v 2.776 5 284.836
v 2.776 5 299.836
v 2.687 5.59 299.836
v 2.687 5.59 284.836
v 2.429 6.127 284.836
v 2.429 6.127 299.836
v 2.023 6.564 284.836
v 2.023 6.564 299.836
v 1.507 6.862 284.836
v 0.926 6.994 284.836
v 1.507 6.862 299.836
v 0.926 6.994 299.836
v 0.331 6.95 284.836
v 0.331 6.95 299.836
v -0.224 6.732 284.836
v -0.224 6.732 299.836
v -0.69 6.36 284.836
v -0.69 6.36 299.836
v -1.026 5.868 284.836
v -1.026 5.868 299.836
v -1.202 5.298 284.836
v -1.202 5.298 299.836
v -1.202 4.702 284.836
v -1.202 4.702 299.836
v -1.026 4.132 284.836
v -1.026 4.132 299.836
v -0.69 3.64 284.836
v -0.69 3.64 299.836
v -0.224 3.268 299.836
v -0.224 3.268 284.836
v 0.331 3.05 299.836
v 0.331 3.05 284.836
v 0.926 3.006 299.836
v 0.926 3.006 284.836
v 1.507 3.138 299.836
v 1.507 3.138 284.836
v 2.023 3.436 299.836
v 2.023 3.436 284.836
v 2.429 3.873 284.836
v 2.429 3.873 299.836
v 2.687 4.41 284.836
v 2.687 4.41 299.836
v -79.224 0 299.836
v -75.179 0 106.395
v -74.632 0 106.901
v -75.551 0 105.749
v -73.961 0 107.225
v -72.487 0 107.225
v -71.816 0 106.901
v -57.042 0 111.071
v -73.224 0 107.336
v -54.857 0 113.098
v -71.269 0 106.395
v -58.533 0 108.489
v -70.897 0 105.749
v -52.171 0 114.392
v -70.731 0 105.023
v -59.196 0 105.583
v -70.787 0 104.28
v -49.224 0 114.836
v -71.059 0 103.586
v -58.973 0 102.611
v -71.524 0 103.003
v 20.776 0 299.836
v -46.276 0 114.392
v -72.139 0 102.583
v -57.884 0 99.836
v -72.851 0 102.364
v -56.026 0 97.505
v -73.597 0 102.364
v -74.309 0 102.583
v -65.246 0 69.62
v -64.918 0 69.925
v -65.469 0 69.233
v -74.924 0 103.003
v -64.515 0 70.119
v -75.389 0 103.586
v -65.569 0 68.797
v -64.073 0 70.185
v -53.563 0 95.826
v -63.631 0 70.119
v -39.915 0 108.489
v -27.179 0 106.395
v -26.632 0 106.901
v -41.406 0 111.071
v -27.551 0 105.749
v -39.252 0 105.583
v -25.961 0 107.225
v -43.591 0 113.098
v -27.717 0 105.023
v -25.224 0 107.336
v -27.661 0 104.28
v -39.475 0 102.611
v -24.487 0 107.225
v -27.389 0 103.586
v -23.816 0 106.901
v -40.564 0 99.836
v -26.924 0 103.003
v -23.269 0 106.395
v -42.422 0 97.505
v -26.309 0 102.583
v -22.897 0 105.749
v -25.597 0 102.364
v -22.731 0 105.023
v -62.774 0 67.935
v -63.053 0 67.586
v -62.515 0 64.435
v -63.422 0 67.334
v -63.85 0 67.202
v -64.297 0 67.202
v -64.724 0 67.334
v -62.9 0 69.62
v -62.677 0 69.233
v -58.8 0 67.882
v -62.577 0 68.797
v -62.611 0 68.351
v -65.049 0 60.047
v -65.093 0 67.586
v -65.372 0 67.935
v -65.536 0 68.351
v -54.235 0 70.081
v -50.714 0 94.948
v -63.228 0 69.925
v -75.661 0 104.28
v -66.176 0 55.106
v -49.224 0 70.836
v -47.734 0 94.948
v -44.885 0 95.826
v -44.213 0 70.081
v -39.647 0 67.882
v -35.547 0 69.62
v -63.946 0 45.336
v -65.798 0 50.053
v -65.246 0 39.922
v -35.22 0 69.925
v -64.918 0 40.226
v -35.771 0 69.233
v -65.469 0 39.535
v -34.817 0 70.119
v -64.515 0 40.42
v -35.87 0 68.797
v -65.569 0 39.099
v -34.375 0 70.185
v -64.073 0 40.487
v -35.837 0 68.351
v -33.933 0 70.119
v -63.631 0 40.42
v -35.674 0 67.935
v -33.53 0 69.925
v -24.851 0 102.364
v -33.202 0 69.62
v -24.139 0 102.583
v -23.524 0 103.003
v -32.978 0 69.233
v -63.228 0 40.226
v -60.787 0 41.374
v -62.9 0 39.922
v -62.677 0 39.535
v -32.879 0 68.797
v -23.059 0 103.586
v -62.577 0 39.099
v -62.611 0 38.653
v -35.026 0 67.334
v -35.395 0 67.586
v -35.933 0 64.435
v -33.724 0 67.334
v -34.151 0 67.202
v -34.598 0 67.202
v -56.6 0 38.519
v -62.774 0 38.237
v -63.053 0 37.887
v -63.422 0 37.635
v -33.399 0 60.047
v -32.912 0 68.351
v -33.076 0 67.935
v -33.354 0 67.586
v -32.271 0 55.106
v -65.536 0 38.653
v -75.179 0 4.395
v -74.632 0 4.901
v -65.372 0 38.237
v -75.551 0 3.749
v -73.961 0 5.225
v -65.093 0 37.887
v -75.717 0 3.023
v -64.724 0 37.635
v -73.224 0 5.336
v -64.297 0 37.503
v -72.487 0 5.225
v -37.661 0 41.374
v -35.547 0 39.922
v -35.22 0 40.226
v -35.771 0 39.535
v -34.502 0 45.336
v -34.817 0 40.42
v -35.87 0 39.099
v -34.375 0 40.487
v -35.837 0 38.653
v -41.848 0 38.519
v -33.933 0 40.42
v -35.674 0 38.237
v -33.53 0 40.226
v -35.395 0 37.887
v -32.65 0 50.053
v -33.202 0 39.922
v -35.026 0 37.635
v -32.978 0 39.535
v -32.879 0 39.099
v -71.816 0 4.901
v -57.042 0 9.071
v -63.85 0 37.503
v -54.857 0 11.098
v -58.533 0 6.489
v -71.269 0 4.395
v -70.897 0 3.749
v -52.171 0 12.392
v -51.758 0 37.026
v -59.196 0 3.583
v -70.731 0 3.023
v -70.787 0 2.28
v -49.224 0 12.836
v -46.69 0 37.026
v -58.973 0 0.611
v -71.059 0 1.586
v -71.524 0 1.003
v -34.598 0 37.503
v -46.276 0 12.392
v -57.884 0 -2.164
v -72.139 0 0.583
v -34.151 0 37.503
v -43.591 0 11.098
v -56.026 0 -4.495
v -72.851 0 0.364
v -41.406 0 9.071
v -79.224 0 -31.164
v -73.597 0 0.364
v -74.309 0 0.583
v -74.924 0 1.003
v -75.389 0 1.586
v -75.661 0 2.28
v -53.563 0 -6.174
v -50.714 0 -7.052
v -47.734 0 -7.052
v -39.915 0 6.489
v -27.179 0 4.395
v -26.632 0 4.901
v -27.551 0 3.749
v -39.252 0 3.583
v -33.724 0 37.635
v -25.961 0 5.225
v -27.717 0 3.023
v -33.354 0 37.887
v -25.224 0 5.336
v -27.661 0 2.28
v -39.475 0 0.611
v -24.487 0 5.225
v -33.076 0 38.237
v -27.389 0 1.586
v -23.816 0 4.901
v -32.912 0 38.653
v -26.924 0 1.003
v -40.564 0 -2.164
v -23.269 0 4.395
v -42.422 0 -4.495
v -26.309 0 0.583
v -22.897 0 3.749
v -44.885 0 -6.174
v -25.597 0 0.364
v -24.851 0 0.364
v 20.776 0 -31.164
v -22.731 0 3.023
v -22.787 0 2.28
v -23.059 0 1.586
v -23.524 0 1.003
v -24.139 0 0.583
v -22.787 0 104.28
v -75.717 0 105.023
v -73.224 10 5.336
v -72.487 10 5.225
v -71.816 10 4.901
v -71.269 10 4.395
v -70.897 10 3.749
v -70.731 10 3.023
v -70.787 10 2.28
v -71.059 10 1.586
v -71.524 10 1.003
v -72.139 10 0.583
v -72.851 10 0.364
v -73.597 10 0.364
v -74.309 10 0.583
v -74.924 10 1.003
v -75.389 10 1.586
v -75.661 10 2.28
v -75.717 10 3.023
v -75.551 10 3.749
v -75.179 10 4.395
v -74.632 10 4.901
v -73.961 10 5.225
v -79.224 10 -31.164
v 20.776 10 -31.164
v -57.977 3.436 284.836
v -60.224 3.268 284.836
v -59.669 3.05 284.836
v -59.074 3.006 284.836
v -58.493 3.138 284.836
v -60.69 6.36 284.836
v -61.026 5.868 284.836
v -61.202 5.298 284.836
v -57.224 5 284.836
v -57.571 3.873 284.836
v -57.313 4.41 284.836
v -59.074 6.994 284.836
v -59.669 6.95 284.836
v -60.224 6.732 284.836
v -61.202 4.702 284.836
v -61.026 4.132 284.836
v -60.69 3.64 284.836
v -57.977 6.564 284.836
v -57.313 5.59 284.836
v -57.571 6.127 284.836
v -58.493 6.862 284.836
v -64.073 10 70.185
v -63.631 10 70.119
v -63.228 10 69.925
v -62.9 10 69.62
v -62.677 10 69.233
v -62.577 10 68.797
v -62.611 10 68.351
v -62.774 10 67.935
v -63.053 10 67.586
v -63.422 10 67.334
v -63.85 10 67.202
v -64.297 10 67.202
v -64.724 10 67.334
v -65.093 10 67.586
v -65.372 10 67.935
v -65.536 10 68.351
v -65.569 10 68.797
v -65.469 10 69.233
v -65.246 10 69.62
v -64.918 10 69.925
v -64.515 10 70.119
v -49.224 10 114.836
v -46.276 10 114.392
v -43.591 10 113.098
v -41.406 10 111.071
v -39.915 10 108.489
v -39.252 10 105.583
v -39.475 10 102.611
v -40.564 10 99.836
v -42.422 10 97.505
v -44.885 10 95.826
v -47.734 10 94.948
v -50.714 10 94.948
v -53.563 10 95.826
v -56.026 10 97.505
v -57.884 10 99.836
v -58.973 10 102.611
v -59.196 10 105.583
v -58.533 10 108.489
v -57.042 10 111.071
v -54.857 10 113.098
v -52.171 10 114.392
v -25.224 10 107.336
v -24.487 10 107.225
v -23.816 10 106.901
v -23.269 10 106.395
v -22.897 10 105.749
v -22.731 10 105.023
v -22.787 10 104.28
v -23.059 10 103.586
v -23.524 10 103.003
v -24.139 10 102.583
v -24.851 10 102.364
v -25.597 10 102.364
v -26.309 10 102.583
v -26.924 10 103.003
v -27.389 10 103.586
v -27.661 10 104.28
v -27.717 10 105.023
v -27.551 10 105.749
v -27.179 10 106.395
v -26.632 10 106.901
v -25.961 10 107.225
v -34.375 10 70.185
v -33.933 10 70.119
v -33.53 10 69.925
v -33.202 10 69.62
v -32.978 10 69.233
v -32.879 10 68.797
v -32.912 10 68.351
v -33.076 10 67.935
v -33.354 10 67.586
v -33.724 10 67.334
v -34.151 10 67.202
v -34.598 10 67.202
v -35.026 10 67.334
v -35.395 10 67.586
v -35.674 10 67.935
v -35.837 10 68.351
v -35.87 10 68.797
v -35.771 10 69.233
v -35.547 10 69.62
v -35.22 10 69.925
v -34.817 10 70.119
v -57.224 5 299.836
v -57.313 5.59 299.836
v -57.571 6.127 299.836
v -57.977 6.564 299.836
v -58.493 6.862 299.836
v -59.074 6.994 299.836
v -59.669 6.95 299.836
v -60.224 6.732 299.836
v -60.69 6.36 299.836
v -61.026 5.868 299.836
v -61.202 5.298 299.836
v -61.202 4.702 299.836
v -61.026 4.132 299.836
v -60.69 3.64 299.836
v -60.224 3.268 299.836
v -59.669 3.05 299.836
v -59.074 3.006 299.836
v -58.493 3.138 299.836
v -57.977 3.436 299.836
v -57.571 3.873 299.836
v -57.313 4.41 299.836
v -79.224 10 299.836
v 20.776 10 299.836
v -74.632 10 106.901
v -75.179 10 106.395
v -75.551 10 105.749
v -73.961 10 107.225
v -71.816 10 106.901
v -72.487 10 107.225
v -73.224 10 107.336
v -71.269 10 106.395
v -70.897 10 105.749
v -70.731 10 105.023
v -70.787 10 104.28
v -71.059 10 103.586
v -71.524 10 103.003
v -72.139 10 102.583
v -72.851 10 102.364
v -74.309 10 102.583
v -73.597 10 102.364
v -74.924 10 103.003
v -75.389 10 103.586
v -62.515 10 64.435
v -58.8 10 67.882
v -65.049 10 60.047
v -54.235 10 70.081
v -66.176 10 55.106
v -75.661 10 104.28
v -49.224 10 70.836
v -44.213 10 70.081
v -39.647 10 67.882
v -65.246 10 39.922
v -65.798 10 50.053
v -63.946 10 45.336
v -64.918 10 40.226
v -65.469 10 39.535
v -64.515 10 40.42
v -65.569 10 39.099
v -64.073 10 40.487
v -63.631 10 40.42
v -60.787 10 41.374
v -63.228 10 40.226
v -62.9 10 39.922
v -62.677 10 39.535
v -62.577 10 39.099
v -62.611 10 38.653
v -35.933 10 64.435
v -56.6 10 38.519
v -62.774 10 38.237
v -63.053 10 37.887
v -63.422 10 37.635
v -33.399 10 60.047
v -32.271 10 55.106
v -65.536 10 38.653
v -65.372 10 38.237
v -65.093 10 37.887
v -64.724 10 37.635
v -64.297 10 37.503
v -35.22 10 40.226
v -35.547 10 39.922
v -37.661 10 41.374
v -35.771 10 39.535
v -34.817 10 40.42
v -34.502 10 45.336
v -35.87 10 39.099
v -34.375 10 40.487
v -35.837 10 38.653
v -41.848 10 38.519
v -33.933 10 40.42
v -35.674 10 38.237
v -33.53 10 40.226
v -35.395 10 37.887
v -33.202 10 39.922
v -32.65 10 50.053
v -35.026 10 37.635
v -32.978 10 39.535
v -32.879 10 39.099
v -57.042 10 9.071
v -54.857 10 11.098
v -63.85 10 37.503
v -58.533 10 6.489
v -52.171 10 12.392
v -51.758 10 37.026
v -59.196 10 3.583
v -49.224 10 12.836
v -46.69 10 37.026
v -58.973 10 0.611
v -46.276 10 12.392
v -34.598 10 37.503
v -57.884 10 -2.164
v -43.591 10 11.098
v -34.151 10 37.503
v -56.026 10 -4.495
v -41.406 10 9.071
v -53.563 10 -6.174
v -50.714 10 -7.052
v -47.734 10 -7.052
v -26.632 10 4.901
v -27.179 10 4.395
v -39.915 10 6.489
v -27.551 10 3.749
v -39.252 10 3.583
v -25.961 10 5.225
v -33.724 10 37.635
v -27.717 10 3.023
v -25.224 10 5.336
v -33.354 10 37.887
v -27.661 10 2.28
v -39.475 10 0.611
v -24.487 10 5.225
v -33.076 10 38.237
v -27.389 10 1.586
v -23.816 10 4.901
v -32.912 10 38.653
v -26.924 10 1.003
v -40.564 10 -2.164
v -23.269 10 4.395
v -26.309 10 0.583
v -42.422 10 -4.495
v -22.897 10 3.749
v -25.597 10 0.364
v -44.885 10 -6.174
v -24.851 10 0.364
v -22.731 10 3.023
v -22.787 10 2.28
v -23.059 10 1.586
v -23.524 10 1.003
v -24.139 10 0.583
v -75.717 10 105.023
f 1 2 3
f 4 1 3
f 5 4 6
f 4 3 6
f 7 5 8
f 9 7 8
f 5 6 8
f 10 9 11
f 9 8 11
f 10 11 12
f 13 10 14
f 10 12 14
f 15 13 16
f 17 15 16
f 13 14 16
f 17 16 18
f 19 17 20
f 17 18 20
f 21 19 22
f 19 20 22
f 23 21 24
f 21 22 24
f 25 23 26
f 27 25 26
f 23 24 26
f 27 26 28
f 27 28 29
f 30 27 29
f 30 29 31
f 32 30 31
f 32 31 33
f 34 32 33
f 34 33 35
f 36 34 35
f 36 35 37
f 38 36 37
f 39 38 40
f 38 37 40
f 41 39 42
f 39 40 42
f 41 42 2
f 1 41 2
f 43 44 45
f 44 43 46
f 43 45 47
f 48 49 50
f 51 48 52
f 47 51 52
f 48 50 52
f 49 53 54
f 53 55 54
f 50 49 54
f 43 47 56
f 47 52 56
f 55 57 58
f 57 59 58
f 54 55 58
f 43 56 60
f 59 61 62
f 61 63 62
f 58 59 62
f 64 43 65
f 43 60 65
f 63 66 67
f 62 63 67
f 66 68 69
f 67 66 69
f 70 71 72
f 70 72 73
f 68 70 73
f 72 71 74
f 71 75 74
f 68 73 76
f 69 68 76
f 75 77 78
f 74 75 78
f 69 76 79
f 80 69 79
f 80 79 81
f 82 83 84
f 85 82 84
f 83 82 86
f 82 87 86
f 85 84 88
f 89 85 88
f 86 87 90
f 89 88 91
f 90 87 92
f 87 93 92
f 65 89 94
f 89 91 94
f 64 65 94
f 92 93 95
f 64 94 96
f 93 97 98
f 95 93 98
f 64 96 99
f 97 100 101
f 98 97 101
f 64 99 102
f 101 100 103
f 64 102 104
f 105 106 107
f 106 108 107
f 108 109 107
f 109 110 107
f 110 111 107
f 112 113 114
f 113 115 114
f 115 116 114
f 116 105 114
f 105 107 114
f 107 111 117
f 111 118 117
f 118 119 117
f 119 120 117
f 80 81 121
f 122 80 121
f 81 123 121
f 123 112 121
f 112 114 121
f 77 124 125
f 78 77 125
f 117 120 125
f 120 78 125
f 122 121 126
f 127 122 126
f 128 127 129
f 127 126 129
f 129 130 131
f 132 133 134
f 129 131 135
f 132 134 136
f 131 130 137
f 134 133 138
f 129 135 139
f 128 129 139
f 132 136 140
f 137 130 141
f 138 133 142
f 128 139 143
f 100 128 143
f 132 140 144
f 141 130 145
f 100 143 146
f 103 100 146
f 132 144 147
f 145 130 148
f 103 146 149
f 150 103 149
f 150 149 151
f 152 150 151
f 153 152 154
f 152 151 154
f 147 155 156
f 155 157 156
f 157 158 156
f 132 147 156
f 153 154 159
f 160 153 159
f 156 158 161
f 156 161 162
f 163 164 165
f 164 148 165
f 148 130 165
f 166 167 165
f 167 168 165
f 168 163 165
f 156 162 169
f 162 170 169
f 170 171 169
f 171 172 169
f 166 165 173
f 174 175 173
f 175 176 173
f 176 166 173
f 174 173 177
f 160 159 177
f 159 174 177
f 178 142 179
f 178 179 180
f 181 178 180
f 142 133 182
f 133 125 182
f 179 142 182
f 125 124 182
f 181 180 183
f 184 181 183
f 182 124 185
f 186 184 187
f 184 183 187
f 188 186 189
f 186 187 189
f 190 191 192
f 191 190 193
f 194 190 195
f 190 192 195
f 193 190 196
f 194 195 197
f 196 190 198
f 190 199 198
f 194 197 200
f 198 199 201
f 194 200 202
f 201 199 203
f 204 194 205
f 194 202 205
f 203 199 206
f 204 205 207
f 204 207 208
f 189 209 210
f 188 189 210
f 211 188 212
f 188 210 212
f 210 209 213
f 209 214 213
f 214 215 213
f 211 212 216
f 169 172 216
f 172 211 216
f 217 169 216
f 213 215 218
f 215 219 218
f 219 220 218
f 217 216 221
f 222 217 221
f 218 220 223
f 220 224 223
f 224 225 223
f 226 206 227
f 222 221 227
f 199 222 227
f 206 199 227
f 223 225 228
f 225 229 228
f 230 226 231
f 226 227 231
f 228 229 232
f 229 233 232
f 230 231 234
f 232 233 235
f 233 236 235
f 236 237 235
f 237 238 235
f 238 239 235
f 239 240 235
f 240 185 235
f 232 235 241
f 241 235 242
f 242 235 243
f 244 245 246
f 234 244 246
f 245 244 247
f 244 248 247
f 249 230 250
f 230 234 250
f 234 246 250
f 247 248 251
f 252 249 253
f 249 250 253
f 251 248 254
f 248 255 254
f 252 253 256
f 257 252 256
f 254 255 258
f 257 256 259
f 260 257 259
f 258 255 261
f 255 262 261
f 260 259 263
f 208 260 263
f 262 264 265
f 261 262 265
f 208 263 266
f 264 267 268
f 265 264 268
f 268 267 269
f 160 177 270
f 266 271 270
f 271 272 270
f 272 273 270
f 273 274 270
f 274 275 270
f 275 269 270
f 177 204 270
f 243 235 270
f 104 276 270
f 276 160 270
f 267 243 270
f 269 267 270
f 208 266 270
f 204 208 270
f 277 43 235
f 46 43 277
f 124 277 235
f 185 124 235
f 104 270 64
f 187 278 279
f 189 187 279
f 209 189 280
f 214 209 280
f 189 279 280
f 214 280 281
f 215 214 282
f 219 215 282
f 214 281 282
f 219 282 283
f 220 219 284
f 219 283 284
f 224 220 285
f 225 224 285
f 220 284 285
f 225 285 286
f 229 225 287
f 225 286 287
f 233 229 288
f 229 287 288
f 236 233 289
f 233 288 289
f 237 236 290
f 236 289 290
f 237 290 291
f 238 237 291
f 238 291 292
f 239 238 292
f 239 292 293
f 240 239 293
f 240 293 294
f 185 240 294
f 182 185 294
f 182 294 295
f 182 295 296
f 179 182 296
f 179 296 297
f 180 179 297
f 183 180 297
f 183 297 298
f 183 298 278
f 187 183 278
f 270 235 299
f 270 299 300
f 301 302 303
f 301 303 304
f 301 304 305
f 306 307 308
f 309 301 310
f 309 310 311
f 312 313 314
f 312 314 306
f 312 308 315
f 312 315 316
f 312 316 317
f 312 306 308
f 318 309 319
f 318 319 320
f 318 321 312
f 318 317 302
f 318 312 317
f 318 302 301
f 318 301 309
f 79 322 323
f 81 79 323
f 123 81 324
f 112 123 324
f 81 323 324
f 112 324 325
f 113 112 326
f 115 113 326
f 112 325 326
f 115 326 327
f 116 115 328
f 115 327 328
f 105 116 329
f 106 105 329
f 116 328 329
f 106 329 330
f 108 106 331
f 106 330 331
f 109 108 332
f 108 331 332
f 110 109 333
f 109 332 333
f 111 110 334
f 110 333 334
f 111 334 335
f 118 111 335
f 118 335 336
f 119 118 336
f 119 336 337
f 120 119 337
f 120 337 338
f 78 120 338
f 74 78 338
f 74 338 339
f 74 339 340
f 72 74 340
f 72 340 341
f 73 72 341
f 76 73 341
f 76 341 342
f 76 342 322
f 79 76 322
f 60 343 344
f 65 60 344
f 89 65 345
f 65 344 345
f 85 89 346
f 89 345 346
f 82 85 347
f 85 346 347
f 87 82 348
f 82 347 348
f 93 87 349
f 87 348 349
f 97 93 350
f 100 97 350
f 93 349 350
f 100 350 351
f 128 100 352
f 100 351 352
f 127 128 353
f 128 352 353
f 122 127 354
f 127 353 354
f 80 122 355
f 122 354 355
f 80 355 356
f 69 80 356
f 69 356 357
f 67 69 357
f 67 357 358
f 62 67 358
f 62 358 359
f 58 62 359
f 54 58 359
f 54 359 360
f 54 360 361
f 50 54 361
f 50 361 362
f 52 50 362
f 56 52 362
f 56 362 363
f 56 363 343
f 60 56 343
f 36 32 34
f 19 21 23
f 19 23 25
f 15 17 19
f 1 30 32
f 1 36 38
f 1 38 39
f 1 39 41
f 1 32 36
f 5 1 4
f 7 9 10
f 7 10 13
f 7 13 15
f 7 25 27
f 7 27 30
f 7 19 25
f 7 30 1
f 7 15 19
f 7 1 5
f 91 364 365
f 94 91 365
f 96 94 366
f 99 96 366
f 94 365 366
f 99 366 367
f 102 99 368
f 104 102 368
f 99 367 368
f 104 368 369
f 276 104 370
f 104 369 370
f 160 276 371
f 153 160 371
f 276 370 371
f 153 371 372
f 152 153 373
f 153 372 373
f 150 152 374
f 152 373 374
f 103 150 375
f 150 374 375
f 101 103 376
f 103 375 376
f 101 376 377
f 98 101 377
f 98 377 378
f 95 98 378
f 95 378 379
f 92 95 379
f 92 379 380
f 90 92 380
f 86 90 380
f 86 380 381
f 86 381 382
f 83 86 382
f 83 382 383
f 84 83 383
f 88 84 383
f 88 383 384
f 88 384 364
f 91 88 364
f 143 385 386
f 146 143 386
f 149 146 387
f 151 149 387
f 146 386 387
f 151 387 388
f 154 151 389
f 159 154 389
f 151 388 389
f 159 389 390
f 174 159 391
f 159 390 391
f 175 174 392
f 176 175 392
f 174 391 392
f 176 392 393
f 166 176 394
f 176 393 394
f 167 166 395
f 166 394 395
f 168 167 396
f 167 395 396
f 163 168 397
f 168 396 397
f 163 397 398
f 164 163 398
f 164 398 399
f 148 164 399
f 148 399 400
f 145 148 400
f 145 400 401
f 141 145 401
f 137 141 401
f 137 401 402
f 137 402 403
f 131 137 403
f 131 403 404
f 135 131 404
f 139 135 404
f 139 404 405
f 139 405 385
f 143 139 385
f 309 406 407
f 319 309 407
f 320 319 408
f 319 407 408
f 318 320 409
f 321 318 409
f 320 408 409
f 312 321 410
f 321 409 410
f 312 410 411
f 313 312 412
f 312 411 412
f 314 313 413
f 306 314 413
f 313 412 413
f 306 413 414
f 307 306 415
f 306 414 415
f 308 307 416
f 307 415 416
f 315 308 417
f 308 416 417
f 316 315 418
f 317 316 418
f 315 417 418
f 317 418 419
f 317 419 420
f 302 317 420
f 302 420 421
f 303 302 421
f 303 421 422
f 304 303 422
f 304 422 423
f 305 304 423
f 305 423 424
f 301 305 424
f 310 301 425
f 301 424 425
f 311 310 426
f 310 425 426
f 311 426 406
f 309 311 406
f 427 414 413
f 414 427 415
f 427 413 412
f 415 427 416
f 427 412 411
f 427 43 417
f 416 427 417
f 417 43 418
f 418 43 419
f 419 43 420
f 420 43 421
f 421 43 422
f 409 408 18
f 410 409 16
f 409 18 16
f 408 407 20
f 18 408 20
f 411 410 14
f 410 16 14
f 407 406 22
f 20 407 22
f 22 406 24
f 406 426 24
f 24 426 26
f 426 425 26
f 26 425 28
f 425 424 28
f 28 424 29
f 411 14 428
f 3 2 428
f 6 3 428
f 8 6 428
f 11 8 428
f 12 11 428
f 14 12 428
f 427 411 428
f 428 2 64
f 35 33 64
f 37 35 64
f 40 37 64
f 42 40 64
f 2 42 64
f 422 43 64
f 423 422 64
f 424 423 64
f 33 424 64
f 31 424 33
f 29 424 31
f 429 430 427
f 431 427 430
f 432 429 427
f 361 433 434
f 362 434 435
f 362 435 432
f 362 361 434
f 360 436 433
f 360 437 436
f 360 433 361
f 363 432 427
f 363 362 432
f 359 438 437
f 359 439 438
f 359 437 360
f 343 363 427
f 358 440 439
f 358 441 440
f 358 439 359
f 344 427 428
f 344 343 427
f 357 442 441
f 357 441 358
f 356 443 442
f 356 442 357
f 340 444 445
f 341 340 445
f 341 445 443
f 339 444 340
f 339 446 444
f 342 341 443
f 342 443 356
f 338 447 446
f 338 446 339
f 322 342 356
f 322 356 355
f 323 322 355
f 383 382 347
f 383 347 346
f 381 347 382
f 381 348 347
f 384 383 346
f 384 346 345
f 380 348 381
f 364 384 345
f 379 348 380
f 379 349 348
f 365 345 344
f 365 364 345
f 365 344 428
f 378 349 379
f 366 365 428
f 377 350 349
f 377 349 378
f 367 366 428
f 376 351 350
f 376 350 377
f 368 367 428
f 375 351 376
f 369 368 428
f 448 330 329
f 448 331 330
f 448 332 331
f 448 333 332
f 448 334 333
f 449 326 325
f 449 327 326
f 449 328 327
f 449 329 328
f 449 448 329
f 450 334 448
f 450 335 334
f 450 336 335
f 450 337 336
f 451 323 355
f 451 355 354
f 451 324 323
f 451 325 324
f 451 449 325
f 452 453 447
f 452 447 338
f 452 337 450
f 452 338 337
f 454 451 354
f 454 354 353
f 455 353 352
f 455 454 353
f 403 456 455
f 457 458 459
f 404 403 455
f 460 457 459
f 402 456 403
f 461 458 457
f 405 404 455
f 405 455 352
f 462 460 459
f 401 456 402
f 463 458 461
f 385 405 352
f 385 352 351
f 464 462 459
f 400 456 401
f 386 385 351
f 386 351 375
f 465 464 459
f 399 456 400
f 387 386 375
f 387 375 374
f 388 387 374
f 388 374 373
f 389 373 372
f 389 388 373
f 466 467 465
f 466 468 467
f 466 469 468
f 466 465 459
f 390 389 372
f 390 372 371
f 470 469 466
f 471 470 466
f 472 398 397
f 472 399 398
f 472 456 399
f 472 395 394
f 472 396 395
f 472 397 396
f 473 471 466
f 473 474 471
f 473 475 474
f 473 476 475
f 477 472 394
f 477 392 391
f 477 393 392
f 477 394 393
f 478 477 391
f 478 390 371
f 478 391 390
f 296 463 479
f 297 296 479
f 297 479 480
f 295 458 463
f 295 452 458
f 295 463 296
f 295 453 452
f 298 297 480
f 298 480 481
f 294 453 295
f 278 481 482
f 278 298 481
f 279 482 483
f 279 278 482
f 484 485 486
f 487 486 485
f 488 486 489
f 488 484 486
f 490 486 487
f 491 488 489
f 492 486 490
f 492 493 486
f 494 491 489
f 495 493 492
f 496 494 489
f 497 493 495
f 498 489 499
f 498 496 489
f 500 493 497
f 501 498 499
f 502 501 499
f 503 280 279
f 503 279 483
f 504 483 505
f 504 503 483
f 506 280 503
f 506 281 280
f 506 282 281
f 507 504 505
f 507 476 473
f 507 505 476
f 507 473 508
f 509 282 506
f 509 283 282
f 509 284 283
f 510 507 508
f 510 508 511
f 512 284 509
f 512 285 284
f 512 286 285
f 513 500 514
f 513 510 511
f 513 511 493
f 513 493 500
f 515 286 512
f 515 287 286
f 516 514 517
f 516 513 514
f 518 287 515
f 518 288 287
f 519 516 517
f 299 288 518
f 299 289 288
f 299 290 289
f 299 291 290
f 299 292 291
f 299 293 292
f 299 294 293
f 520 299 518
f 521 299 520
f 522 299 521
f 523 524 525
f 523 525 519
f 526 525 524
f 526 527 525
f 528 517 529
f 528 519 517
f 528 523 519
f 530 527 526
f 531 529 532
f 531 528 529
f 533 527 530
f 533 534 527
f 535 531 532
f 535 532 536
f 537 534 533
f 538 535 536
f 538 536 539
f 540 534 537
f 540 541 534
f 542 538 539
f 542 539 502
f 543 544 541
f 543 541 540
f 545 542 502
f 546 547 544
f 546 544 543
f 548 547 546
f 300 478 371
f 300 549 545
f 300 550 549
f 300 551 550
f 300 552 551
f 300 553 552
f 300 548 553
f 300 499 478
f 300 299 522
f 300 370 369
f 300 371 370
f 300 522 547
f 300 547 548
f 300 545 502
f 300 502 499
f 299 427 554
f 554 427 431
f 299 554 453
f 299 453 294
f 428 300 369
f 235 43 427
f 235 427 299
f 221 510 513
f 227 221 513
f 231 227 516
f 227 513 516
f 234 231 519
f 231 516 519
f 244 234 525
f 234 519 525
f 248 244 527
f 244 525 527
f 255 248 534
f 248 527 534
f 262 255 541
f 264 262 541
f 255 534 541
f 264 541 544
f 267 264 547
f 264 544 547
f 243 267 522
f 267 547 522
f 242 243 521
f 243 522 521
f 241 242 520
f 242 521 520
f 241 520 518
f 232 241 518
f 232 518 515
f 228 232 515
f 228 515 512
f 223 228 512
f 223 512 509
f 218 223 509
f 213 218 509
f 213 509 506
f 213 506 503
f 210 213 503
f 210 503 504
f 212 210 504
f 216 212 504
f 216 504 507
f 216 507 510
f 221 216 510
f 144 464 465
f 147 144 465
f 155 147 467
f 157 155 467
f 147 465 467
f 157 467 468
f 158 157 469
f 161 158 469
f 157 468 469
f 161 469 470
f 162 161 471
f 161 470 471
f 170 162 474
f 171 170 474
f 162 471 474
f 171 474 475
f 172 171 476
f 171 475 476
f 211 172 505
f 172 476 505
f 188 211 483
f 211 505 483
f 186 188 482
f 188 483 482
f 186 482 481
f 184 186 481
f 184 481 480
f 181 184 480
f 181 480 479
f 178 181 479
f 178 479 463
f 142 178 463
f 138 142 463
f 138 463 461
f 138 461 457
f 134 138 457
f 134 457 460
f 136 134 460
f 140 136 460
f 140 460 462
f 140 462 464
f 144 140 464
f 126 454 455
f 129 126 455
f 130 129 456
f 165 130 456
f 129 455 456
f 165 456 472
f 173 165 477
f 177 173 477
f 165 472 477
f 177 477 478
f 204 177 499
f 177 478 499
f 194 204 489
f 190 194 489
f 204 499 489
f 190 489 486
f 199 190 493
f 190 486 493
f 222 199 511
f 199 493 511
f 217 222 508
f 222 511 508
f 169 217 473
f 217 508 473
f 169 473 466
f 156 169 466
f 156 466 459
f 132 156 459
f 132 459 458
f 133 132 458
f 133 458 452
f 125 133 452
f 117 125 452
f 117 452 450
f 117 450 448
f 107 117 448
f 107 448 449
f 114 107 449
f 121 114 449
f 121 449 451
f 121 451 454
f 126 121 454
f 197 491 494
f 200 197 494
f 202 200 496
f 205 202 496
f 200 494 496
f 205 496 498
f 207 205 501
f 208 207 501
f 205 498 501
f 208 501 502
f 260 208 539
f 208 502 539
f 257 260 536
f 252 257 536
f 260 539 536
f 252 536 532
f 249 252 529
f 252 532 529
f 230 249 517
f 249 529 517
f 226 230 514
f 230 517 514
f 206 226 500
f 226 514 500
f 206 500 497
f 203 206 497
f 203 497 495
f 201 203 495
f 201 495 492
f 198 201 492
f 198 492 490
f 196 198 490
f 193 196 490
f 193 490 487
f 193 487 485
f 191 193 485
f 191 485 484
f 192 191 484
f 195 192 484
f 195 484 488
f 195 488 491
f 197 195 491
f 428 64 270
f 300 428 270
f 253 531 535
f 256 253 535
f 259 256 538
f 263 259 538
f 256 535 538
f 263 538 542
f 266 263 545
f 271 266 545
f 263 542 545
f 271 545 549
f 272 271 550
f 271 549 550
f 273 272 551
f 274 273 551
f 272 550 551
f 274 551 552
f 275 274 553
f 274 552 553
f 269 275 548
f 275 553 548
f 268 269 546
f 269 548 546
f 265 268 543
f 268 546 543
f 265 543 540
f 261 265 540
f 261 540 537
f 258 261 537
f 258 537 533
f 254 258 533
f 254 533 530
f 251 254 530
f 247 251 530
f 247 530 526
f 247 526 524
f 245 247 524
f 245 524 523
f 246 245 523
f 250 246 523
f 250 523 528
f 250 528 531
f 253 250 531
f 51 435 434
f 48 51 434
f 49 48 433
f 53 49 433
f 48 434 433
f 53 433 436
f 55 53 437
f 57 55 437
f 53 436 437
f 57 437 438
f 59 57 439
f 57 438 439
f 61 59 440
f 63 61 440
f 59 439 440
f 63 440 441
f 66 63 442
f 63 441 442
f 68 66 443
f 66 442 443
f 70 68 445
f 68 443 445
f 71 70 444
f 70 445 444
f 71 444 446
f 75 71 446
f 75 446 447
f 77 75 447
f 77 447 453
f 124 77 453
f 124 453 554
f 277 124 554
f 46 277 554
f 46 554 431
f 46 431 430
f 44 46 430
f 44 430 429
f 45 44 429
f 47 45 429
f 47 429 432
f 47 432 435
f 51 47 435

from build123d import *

# Parameters (mm, degrees)
SKETCH1_W           = 100
SKETCH1_H           = 331
BOSS_EXTRUDE1_DEPTH = 10
SKETCH2_R           = 10
SKETCH2_R_2         = 2.5
SKETCH2_R_3         = 17
SKETCH2_R_4         = 1.5
CUT_EXTRUDE1_DEPTH  = 311.286961886
SKETCH3_R           = 2
CUT_EXTRUDE2_DEPTH  = 15


with BuildPart() as part:
    # Sketch1 → Boss-Extrude1 (new body)
    with BuildSketch(Plane(origin=(0, 0, 0), x_dir=(1, 0, 0), z_dir=(0, 1, 0))):
        with Locations((-29.223933498, -134.335900248)):
            Rectangle(SKETCH1_W, SKETCH1_H)
    extrude(amount=BOSS_EXTRUDE1_DEPTH)

    # Sketch2 → Cut-Extrude1 (cut, through all)
    with BuildSketch(Plane(origin=(0, 10, 0), x_dir=(1, 0, 0), z_dir=(0, 1, 0))):
        with Locations(Location((-49.223933498, -2.835900248, 0), (0, 0, 270))):
            Circle(SKETCH2_R)
        with Locations(Location((-73.223933498, -2.835900248, 0), (0, 0, 270))):
            Circle(SKETCH2_R_2)
        with Locations(Location((-25.223933498, -2.835900248, 0), (0, 0, 270))):
            Circle(SKETCH2_R_2)
        with Locations(Location((-49.223933498, -104.835900248, 0), (0, 0, 270))):
            Circle(SKETCH2_R)
        with Locations(Location((-73.223933498, -104.835900248, 0), (0, 0, 270))):
            Circle(SKETCH2_R_2)
        with Locations(Location((-25.223933498, -104.835900248, 0), (0, 0, 270))):
            Circle(SKETCH2_R_2)
        with Locations(Location((-49.223933498, -53.835900248, 0), (0, 0, 270))):
            Circle(SKETCH2_R_3)
        with Locations(Location((-64.073175903, -38.986657843, 0), (0, 0, 270))):
            Circle(SKETCH2_R_4)
        with Locations(Location((-34.374691094, -38.986657843, 0), (0, 0, 270))):
            Circle(SKETCH2_R_4)
        with Locations(Location((-34.374691094, -68.685142653, 0), (0, 0, 270))):
            Circle(SKETCH2_R_4)
        with Locations(Location((-64.073175903, -68.685142653, 0), (0, 0, 270))):
            Circle(SKETCH2_R_4)
    extrude(amount=-CUT_EXTRUDE1_DEPTH, mode=Mode.SUBTRACT)

    # Sketch3 → Cut-Extrude2 (cut)
    with BuildSketch(Plane.XY.offset(299.835900248)):
        with Locations((-59.223933498, 5)):
            Circle(SKETCH3_R)
        with Locations((0.776066502, 5)):
            Circle(SKETCH3_R)
    extrude(amount=-CUT_EXTRUDE2_DEPTH, mode=Mode.SUBTRACT)


solid = part.part
